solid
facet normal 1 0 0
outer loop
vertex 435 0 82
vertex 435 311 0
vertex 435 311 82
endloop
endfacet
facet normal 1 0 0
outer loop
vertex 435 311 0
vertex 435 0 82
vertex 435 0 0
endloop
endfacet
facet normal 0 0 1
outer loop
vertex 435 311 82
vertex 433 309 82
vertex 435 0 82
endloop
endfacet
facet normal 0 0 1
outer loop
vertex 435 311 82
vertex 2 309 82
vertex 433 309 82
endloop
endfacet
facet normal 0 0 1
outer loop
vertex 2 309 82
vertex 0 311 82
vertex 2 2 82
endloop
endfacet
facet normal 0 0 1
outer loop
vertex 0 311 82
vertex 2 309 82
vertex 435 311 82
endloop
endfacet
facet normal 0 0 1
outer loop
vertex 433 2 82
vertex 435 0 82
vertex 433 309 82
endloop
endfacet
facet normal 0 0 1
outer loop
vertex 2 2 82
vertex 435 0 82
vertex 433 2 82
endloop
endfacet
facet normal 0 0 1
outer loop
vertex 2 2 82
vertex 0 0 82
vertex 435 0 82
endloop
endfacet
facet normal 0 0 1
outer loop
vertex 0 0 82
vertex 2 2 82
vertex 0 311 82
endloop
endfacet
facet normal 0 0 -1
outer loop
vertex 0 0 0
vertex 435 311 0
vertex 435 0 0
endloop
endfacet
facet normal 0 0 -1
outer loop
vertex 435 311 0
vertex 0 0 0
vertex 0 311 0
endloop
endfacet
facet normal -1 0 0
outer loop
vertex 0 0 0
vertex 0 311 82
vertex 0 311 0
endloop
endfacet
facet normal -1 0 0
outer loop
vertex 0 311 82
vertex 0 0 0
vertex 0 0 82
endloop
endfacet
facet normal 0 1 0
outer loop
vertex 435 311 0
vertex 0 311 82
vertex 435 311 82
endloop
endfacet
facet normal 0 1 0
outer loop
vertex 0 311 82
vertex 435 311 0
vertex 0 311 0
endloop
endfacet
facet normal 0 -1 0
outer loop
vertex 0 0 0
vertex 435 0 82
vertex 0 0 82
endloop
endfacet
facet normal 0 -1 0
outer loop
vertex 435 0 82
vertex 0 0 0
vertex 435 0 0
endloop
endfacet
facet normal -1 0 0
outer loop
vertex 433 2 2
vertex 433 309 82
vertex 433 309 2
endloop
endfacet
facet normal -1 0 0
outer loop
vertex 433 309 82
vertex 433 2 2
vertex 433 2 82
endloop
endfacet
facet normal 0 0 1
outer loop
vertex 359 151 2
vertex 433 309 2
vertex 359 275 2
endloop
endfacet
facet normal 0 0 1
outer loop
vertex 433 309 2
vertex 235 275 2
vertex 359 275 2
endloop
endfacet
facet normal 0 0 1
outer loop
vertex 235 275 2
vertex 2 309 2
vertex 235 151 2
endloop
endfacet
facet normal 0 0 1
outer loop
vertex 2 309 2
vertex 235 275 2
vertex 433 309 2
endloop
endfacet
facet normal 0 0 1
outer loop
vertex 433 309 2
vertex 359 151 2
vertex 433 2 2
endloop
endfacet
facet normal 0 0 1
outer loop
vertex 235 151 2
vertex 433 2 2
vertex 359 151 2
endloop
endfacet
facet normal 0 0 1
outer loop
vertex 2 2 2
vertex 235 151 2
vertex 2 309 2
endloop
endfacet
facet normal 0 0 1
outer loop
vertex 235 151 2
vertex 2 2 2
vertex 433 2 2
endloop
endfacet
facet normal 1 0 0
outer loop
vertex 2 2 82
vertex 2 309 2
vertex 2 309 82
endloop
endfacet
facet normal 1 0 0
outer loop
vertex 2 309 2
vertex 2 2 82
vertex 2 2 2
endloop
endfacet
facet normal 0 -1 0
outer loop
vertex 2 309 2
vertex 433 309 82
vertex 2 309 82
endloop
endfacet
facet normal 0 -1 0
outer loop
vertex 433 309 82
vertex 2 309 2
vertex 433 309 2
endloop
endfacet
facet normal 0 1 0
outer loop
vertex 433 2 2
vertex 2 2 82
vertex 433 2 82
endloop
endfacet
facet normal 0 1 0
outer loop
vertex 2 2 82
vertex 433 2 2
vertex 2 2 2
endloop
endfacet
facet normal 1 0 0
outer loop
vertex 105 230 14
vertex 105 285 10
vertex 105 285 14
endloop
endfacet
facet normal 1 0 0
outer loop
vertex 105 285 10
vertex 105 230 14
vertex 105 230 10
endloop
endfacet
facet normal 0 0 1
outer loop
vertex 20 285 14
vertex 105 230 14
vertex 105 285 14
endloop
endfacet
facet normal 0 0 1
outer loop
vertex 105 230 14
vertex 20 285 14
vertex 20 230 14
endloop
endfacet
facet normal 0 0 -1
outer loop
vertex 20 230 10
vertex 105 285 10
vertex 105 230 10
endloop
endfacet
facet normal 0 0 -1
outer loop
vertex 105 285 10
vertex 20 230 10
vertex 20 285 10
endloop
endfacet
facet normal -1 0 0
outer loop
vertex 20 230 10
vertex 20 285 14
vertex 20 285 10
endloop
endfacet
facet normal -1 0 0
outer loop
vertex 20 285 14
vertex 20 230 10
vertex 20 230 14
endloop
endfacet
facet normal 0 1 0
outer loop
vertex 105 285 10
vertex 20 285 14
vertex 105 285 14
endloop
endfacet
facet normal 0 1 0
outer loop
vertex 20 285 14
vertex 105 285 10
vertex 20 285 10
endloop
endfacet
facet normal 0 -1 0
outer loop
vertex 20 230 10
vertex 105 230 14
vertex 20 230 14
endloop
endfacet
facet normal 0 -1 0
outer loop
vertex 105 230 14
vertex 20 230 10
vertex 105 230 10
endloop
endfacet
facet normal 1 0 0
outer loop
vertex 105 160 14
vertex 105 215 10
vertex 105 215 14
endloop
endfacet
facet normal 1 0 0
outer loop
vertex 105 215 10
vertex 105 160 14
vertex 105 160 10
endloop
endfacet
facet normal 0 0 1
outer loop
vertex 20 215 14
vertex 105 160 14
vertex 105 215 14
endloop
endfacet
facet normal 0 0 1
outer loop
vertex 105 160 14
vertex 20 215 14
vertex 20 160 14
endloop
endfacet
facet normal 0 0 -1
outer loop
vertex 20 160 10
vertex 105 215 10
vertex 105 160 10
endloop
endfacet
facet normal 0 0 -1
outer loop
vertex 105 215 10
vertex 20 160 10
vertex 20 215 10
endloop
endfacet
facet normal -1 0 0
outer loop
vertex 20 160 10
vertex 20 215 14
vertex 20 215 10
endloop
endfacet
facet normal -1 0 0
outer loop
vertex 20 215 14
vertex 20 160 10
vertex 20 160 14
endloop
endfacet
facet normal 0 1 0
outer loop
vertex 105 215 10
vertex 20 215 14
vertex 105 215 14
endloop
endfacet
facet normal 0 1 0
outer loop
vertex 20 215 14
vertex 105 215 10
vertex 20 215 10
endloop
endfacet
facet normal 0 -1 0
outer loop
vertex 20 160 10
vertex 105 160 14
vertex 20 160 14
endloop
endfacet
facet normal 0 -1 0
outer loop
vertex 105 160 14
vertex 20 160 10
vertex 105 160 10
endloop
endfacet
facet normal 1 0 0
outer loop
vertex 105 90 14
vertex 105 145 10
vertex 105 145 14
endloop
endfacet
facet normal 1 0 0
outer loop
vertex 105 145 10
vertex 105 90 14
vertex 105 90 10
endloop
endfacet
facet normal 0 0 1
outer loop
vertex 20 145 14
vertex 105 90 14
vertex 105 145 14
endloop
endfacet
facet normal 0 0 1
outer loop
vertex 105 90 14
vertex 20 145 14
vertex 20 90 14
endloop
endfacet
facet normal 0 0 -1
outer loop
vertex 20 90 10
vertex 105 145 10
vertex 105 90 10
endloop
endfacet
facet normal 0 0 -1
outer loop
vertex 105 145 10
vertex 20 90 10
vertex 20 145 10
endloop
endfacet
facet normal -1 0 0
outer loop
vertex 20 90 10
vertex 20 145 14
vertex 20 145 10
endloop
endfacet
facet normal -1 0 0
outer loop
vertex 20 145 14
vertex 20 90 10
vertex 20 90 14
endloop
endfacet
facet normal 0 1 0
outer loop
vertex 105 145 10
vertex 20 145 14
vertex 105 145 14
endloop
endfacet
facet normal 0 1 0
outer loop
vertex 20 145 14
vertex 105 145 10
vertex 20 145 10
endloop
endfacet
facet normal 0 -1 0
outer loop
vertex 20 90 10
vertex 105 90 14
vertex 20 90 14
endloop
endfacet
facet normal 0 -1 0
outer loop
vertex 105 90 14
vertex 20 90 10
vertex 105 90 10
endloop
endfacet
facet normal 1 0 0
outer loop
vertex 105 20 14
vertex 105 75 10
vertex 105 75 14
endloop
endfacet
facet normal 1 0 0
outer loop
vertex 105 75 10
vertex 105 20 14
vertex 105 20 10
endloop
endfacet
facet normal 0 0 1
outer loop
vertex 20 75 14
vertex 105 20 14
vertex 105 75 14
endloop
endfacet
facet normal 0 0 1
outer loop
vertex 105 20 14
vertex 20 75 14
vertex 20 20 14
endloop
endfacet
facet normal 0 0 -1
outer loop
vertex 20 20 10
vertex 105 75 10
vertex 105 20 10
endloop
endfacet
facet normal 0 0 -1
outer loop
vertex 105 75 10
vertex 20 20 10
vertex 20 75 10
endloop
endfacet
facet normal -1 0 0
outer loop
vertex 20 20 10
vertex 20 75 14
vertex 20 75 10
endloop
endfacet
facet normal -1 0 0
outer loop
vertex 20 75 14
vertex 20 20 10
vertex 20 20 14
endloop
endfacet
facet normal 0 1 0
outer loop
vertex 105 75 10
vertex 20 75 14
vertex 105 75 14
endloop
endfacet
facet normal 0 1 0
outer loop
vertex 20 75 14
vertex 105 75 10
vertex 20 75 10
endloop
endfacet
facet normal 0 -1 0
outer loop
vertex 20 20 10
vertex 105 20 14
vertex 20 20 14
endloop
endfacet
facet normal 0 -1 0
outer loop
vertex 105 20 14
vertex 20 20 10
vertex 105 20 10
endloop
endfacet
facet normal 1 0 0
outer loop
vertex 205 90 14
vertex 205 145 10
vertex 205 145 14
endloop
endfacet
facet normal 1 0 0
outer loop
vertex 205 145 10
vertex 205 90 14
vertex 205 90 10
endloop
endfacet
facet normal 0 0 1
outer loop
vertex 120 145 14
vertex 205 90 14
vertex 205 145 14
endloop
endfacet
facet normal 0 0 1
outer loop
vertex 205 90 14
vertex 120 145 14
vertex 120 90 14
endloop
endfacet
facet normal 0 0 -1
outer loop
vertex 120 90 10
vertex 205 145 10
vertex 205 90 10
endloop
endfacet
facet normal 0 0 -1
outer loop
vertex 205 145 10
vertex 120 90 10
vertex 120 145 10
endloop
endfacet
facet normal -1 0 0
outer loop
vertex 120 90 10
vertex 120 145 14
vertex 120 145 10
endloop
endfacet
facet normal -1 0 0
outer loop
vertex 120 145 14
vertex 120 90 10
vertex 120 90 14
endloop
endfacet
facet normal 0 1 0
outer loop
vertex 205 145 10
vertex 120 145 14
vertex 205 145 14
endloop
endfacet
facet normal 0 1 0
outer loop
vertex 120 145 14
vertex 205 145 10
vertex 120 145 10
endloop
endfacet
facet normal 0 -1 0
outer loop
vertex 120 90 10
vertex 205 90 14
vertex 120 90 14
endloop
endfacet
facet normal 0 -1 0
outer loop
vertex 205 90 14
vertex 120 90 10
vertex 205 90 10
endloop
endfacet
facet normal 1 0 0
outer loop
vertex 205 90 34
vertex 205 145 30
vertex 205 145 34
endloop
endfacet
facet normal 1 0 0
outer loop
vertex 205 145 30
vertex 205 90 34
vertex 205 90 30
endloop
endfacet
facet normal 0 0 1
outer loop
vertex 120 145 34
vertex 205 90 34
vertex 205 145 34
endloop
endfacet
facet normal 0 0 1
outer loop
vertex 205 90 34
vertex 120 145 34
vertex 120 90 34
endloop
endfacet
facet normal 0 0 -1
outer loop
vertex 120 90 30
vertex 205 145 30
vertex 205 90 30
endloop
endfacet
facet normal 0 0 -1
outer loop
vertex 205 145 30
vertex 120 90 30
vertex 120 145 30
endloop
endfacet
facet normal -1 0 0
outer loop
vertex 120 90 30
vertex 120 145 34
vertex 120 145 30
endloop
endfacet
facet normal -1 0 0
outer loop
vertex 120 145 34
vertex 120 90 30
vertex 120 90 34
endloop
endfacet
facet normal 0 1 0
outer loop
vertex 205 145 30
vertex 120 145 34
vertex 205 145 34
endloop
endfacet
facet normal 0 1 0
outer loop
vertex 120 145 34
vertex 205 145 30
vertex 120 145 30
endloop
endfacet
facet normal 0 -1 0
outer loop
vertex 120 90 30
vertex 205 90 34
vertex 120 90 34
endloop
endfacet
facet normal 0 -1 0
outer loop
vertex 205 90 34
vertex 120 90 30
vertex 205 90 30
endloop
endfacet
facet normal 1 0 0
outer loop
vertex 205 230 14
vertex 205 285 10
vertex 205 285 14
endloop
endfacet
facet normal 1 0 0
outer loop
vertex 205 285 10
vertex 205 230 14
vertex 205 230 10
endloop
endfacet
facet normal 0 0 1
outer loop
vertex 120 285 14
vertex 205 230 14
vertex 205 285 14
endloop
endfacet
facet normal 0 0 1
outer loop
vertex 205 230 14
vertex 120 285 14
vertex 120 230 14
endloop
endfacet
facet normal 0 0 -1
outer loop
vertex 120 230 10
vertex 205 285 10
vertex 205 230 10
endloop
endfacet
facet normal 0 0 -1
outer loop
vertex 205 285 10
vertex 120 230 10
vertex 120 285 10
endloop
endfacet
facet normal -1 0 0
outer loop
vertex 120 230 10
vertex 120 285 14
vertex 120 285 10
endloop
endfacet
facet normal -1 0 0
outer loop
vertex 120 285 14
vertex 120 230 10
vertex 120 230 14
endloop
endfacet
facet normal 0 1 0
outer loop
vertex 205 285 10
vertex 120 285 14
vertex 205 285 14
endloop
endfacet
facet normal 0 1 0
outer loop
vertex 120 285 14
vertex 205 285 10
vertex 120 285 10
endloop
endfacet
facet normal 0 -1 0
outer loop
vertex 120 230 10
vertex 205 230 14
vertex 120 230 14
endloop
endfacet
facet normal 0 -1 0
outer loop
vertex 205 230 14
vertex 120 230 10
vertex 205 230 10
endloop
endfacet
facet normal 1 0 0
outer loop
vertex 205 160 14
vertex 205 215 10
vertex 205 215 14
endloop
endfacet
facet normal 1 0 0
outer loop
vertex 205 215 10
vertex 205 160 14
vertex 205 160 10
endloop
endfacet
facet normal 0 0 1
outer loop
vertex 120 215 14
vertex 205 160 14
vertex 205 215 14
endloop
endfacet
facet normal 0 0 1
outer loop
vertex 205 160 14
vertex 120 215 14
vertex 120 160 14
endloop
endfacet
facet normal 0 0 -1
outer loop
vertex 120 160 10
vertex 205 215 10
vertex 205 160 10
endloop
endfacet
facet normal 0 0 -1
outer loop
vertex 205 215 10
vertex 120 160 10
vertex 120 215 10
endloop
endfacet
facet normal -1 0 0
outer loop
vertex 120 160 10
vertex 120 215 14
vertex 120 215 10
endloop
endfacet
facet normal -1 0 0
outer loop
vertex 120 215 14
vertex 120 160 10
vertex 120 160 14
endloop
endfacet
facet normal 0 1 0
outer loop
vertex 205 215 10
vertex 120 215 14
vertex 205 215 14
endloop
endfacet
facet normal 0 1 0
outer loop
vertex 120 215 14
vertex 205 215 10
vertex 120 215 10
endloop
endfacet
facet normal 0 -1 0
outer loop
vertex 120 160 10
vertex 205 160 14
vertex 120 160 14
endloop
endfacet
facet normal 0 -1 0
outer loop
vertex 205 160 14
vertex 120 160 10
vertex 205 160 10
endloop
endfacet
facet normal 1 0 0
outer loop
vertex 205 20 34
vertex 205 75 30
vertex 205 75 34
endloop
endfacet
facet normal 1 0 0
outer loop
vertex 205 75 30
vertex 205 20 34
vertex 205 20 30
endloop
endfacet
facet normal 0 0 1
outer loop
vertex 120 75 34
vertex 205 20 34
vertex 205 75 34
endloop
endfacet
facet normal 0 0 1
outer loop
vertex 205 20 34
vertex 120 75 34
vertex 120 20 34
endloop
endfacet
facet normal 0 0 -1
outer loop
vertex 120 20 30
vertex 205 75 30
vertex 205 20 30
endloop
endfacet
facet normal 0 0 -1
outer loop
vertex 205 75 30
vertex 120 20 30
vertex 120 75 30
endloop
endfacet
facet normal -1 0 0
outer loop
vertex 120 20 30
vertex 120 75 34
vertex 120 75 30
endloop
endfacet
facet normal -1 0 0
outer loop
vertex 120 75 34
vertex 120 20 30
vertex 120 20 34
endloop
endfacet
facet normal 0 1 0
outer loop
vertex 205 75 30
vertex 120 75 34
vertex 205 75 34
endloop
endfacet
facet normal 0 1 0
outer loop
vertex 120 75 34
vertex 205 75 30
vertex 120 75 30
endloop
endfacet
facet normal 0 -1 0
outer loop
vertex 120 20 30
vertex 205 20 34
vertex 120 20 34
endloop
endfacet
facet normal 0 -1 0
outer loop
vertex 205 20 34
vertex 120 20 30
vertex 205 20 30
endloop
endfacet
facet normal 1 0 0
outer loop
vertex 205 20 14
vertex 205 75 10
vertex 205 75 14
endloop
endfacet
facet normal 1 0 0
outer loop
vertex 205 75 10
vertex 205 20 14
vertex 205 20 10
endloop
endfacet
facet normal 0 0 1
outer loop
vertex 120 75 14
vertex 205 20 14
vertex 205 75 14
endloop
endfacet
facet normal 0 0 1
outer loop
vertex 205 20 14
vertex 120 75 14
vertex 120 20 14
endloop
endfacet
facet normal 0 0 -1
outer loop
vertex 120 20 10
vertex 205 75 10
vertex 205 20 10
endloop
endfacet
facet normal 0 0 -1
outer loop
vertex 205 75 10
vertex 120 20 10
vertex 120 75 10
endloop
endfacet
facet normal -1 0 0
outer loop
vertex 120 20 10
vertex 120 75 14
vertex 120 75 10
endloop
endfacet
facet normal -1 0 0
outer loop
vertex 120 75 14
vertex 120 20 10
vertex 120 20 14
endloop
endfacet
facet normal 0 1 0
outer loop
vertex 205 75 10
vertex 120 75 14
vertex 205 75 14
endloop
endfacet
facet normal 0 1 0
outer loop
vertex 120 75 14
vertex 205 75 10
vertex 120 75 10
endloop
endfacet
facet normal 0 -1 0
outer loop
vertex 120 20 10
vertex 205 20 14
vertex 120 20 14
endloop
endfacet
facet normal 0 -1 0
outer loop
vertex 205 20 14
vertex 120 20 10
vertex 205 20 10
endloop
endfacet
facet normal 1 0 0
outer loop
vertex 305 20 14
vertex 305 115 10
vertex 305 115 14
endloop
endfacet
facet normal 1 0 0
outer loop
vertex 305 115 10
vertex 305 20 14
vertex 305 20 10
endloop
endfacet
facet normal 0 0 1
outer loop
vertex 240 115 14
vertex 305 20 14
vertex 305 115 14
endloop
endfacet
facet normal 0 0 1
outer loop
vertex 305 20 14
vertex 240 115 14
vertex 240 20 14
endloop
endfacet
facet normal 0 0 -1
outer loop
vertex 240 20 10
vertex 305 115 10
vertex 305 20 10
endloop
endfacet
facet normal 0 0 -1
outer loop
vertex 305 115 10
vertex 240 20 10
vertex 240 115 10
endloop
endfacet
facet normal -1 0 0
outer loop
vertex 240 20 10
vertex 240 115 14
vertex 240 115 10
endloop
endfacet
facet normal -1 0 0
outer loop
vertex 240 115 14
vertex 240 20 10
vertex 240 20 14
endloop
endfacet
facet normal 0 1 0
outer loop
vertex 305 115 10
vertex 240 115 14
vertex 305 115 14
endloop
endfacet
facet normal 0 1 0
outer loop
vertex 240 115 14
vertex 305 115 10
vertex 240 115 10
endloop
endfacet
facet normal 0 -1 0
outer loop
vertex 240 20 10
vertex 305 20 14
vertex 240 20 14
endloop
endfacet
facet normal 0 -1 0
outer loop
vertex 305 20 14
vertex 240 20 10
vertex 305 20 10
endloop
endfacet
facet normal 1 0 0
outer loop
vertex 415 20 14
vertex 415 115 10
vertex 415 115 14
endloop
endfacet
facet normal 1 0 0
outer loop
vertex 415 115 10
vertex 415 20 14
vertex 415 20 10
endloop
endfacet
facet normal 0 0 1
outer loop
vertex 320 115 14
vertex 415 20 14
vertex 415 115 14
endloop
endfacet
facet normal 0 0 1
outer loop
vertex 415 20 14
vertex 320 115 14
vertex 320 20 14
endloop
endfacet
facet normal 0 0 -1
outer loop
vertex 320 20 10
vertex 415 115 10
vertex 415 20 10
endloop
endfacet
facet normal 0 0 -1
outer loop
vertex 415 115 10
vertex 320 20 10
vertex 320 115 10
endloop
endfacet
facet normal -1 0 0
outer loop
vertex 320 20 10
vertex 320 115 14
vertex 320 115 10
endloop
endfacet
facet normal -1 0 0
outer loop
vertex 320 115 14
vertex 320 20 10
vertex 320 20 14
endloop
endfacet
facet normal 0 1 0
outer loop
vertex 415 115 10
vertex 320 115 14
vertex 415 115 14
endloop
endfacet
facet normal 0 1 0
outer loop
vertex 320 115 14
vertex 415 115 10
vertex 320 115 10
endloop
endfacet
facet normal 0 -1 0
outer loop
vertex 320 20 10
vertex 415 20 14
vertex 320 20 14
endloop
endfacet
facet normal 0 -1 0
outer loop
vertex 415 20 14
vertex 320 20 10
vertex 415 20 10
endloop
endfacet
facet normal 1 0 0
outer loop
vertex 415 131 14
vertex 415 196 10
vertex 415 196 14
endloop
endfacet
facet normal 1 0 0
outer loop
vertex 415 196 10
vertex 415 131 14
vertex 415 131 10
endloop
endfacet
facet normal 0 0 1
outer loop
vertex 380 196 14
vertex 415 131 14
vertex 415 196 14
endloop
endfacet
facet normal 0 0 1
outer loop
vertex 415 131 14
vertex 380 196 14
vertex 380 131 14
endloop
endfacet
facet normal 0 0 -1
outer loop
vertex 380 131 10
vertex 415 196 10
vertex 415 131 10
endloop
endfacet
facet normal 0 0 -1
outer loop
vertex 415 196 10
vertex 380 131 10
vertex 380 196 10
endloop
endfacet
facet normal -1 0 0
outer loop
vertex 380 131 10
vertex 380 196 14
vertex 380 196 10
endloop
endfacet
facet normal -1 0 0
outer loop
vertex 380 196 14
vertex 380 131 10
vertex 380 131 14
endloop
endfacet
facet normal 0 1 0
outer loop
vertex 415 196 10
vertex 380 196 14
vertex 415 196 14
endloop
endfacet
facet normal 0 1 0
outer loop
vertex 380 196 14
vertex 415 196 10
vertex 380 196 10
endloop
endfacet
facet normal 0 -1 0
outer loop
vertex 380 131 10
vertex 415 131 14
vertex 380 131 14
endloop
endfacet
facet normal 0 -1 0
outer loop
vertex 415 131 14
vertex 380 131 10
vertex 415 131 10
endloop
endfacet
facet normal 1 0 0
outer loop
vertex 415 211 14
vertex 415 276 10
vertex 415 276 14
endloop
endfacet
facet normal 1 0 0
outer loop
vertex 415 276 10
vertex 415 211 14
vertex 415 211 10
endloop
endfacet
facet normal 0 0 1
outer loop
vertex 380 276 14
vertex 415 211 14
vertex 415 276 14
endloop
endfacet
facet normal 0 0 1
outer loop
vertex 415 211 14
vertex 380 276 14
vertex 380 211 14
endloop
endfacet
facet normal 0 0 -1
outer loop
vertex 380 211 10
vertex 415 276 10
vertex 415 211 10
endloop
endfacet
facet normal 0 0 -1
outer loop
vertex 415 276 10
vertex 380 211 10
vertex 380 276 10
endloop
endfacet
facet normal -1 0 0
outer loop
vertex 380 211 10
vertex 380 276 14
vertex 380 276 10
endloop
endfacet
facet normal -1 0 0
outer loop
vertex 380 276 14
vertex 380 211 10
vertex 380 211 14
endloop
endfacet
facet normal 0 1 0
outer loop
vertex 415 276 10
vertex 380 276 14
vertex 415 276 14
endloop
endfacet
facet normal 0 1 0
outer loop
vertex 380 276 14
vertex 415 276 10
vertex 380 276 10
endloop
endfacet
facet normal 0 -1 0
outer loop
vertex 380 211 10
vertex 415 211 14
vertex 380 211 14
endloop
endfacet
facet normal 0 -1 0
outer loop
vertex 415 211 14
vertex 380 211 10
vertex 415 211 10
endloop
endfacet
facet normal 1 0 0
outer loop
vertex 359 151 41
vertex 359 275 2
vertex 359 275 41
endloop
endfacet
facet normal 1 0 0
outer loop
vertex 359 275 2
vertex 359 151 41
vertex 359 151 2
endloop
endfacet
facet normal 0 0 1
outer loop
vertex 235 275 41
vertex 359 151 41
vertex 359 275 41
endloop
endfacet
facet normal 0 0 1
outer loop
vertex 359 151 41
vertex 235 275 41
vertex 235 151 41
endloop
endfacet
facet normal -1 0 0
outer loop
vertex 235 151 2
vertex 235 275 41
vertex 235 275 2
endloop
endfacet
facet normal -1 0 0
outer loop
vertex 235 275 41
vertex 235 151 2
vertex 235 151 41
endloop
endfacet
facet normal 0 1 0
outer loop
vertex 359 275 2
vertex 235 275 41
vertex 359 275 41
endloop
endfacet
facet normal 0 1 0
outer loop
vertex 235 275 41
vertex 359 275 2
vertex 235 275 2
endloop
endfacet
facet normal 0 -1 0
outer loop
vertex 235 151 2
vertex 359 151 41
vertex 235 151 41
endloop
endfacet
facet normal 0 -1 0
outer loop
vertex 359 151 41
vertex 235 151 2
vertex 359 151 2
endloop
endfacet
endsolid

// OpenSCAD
width = 435;
height = 82;
depth = 311;

margin_lr = 20;

$fn = 64;

difference() {
  cube( [ width, depth, height ] );
            
  translate( [ 2, 2, 2 ] ) {
    cube( [ width - 4, depth - 4, height + 10 ] );
  }
}

// Column One 

// PCM5142/DAC
translate( [ margin_lr, 220 + margin_lr - 10, 10 ] ) {
  color( "black" )
  cube( [ 85, 55, 4 ] );   
}

// DSP
translate( [ margin_lr, 150 + margin_lr - 10, 10 ] ) {
  color( "orange" )
  cube( [ 85, 55, 4 ] );   
}


/*
// I2S board (violet)
translate( [ margin_lr, margin_lr + 70, 30 ] ) {
  color( "violet" )
  cube( [ 85, 55, 4 ] );   
}
*/


/*
// subwoofer
translate( [ margin_lr, margin_lr + 210, 10 ] ) {
    color( "pink" )
  cube( [ 85, 55, 4 ] );   
}
*/

// SPDIF (cyan)
translate( [ margin_lr, margin_lr + 70, 10 ] ) {
    color( "cyan" )
  cube( [ 85, 55, 4 ] );   
}


// microprocessor
translate( [ margin_lr, margin_lr, 10 ] ) {
  color( "brown" )
  cube( [ 85, 55, 4 ] );   
}



// Column Two

// vinyl (RED)
translate( [ 120, margin_lr + 70, 10 ] ) {
  color( "red" )
  cube( [ 85, 55, 4 ] );   
}

// ADC board (indigo)
translate( [ 120, margin_lr + 70, 30 ] ) {
  color( "indigo" )
  cube( [ 85, 55, 4 ] );   
}


// inputs (grey)
translate( [ 120, margin_lr + 210, 10 ] ) {
  color( "grey" )
  cube( [ 85, 55, 4 ] );   
}

// channel sel (Yellow)
translate( [ 120, margin_lr + 140, 10 ] ) {
  color( "yellow" )
  cube( [ 85, 55, 4 ] );   
}

// GPIO extender (blue)
translate( [ margin_lr + 100, margin_lr, 30 ] ) {
  color( "#000080" )
  cube( [ 85, 55, 4 ] );   
}

// FTDI (purple)
translate( [ margin_lr + 100, margin_lr, 10 ] ) {
  color( "purple" )
  cube( [ 85, 55, 4 ] );   
}

// POWER ROW

// digital/ananlog power suppy
translate( [ 240, margin_lr, 10 ] ) {
  color( "Lavender" )
  cube( [ 65, 95, 4 ] );   
}
    
// power suppy
translate( [ width - margin_lr - 95, margin_lr, 10 ] ) {
  cube( [ 95, 95, 4 ] );   
}

// rectifier (pink)
translate( [ width - margin_lr - 35, depth - 160 - margin_lr, 10 ] ) {
  color( "pink" )
  cube( [ 35, 65, 4 ] );   
}

// ground lift (green)
translate( [ width - margin_lr - 35, depth - 80 - margin_lr, 10 ] ) {
  color( "green" )
  cube( [ 35, 65, 4 ] );   
}



// toroid
translate( [ width - margin_lr - 180, depth - margin_lr - 10 -130, 0 ] ) {
  cube( [ 124, 124, 41 ] );   
}
       
